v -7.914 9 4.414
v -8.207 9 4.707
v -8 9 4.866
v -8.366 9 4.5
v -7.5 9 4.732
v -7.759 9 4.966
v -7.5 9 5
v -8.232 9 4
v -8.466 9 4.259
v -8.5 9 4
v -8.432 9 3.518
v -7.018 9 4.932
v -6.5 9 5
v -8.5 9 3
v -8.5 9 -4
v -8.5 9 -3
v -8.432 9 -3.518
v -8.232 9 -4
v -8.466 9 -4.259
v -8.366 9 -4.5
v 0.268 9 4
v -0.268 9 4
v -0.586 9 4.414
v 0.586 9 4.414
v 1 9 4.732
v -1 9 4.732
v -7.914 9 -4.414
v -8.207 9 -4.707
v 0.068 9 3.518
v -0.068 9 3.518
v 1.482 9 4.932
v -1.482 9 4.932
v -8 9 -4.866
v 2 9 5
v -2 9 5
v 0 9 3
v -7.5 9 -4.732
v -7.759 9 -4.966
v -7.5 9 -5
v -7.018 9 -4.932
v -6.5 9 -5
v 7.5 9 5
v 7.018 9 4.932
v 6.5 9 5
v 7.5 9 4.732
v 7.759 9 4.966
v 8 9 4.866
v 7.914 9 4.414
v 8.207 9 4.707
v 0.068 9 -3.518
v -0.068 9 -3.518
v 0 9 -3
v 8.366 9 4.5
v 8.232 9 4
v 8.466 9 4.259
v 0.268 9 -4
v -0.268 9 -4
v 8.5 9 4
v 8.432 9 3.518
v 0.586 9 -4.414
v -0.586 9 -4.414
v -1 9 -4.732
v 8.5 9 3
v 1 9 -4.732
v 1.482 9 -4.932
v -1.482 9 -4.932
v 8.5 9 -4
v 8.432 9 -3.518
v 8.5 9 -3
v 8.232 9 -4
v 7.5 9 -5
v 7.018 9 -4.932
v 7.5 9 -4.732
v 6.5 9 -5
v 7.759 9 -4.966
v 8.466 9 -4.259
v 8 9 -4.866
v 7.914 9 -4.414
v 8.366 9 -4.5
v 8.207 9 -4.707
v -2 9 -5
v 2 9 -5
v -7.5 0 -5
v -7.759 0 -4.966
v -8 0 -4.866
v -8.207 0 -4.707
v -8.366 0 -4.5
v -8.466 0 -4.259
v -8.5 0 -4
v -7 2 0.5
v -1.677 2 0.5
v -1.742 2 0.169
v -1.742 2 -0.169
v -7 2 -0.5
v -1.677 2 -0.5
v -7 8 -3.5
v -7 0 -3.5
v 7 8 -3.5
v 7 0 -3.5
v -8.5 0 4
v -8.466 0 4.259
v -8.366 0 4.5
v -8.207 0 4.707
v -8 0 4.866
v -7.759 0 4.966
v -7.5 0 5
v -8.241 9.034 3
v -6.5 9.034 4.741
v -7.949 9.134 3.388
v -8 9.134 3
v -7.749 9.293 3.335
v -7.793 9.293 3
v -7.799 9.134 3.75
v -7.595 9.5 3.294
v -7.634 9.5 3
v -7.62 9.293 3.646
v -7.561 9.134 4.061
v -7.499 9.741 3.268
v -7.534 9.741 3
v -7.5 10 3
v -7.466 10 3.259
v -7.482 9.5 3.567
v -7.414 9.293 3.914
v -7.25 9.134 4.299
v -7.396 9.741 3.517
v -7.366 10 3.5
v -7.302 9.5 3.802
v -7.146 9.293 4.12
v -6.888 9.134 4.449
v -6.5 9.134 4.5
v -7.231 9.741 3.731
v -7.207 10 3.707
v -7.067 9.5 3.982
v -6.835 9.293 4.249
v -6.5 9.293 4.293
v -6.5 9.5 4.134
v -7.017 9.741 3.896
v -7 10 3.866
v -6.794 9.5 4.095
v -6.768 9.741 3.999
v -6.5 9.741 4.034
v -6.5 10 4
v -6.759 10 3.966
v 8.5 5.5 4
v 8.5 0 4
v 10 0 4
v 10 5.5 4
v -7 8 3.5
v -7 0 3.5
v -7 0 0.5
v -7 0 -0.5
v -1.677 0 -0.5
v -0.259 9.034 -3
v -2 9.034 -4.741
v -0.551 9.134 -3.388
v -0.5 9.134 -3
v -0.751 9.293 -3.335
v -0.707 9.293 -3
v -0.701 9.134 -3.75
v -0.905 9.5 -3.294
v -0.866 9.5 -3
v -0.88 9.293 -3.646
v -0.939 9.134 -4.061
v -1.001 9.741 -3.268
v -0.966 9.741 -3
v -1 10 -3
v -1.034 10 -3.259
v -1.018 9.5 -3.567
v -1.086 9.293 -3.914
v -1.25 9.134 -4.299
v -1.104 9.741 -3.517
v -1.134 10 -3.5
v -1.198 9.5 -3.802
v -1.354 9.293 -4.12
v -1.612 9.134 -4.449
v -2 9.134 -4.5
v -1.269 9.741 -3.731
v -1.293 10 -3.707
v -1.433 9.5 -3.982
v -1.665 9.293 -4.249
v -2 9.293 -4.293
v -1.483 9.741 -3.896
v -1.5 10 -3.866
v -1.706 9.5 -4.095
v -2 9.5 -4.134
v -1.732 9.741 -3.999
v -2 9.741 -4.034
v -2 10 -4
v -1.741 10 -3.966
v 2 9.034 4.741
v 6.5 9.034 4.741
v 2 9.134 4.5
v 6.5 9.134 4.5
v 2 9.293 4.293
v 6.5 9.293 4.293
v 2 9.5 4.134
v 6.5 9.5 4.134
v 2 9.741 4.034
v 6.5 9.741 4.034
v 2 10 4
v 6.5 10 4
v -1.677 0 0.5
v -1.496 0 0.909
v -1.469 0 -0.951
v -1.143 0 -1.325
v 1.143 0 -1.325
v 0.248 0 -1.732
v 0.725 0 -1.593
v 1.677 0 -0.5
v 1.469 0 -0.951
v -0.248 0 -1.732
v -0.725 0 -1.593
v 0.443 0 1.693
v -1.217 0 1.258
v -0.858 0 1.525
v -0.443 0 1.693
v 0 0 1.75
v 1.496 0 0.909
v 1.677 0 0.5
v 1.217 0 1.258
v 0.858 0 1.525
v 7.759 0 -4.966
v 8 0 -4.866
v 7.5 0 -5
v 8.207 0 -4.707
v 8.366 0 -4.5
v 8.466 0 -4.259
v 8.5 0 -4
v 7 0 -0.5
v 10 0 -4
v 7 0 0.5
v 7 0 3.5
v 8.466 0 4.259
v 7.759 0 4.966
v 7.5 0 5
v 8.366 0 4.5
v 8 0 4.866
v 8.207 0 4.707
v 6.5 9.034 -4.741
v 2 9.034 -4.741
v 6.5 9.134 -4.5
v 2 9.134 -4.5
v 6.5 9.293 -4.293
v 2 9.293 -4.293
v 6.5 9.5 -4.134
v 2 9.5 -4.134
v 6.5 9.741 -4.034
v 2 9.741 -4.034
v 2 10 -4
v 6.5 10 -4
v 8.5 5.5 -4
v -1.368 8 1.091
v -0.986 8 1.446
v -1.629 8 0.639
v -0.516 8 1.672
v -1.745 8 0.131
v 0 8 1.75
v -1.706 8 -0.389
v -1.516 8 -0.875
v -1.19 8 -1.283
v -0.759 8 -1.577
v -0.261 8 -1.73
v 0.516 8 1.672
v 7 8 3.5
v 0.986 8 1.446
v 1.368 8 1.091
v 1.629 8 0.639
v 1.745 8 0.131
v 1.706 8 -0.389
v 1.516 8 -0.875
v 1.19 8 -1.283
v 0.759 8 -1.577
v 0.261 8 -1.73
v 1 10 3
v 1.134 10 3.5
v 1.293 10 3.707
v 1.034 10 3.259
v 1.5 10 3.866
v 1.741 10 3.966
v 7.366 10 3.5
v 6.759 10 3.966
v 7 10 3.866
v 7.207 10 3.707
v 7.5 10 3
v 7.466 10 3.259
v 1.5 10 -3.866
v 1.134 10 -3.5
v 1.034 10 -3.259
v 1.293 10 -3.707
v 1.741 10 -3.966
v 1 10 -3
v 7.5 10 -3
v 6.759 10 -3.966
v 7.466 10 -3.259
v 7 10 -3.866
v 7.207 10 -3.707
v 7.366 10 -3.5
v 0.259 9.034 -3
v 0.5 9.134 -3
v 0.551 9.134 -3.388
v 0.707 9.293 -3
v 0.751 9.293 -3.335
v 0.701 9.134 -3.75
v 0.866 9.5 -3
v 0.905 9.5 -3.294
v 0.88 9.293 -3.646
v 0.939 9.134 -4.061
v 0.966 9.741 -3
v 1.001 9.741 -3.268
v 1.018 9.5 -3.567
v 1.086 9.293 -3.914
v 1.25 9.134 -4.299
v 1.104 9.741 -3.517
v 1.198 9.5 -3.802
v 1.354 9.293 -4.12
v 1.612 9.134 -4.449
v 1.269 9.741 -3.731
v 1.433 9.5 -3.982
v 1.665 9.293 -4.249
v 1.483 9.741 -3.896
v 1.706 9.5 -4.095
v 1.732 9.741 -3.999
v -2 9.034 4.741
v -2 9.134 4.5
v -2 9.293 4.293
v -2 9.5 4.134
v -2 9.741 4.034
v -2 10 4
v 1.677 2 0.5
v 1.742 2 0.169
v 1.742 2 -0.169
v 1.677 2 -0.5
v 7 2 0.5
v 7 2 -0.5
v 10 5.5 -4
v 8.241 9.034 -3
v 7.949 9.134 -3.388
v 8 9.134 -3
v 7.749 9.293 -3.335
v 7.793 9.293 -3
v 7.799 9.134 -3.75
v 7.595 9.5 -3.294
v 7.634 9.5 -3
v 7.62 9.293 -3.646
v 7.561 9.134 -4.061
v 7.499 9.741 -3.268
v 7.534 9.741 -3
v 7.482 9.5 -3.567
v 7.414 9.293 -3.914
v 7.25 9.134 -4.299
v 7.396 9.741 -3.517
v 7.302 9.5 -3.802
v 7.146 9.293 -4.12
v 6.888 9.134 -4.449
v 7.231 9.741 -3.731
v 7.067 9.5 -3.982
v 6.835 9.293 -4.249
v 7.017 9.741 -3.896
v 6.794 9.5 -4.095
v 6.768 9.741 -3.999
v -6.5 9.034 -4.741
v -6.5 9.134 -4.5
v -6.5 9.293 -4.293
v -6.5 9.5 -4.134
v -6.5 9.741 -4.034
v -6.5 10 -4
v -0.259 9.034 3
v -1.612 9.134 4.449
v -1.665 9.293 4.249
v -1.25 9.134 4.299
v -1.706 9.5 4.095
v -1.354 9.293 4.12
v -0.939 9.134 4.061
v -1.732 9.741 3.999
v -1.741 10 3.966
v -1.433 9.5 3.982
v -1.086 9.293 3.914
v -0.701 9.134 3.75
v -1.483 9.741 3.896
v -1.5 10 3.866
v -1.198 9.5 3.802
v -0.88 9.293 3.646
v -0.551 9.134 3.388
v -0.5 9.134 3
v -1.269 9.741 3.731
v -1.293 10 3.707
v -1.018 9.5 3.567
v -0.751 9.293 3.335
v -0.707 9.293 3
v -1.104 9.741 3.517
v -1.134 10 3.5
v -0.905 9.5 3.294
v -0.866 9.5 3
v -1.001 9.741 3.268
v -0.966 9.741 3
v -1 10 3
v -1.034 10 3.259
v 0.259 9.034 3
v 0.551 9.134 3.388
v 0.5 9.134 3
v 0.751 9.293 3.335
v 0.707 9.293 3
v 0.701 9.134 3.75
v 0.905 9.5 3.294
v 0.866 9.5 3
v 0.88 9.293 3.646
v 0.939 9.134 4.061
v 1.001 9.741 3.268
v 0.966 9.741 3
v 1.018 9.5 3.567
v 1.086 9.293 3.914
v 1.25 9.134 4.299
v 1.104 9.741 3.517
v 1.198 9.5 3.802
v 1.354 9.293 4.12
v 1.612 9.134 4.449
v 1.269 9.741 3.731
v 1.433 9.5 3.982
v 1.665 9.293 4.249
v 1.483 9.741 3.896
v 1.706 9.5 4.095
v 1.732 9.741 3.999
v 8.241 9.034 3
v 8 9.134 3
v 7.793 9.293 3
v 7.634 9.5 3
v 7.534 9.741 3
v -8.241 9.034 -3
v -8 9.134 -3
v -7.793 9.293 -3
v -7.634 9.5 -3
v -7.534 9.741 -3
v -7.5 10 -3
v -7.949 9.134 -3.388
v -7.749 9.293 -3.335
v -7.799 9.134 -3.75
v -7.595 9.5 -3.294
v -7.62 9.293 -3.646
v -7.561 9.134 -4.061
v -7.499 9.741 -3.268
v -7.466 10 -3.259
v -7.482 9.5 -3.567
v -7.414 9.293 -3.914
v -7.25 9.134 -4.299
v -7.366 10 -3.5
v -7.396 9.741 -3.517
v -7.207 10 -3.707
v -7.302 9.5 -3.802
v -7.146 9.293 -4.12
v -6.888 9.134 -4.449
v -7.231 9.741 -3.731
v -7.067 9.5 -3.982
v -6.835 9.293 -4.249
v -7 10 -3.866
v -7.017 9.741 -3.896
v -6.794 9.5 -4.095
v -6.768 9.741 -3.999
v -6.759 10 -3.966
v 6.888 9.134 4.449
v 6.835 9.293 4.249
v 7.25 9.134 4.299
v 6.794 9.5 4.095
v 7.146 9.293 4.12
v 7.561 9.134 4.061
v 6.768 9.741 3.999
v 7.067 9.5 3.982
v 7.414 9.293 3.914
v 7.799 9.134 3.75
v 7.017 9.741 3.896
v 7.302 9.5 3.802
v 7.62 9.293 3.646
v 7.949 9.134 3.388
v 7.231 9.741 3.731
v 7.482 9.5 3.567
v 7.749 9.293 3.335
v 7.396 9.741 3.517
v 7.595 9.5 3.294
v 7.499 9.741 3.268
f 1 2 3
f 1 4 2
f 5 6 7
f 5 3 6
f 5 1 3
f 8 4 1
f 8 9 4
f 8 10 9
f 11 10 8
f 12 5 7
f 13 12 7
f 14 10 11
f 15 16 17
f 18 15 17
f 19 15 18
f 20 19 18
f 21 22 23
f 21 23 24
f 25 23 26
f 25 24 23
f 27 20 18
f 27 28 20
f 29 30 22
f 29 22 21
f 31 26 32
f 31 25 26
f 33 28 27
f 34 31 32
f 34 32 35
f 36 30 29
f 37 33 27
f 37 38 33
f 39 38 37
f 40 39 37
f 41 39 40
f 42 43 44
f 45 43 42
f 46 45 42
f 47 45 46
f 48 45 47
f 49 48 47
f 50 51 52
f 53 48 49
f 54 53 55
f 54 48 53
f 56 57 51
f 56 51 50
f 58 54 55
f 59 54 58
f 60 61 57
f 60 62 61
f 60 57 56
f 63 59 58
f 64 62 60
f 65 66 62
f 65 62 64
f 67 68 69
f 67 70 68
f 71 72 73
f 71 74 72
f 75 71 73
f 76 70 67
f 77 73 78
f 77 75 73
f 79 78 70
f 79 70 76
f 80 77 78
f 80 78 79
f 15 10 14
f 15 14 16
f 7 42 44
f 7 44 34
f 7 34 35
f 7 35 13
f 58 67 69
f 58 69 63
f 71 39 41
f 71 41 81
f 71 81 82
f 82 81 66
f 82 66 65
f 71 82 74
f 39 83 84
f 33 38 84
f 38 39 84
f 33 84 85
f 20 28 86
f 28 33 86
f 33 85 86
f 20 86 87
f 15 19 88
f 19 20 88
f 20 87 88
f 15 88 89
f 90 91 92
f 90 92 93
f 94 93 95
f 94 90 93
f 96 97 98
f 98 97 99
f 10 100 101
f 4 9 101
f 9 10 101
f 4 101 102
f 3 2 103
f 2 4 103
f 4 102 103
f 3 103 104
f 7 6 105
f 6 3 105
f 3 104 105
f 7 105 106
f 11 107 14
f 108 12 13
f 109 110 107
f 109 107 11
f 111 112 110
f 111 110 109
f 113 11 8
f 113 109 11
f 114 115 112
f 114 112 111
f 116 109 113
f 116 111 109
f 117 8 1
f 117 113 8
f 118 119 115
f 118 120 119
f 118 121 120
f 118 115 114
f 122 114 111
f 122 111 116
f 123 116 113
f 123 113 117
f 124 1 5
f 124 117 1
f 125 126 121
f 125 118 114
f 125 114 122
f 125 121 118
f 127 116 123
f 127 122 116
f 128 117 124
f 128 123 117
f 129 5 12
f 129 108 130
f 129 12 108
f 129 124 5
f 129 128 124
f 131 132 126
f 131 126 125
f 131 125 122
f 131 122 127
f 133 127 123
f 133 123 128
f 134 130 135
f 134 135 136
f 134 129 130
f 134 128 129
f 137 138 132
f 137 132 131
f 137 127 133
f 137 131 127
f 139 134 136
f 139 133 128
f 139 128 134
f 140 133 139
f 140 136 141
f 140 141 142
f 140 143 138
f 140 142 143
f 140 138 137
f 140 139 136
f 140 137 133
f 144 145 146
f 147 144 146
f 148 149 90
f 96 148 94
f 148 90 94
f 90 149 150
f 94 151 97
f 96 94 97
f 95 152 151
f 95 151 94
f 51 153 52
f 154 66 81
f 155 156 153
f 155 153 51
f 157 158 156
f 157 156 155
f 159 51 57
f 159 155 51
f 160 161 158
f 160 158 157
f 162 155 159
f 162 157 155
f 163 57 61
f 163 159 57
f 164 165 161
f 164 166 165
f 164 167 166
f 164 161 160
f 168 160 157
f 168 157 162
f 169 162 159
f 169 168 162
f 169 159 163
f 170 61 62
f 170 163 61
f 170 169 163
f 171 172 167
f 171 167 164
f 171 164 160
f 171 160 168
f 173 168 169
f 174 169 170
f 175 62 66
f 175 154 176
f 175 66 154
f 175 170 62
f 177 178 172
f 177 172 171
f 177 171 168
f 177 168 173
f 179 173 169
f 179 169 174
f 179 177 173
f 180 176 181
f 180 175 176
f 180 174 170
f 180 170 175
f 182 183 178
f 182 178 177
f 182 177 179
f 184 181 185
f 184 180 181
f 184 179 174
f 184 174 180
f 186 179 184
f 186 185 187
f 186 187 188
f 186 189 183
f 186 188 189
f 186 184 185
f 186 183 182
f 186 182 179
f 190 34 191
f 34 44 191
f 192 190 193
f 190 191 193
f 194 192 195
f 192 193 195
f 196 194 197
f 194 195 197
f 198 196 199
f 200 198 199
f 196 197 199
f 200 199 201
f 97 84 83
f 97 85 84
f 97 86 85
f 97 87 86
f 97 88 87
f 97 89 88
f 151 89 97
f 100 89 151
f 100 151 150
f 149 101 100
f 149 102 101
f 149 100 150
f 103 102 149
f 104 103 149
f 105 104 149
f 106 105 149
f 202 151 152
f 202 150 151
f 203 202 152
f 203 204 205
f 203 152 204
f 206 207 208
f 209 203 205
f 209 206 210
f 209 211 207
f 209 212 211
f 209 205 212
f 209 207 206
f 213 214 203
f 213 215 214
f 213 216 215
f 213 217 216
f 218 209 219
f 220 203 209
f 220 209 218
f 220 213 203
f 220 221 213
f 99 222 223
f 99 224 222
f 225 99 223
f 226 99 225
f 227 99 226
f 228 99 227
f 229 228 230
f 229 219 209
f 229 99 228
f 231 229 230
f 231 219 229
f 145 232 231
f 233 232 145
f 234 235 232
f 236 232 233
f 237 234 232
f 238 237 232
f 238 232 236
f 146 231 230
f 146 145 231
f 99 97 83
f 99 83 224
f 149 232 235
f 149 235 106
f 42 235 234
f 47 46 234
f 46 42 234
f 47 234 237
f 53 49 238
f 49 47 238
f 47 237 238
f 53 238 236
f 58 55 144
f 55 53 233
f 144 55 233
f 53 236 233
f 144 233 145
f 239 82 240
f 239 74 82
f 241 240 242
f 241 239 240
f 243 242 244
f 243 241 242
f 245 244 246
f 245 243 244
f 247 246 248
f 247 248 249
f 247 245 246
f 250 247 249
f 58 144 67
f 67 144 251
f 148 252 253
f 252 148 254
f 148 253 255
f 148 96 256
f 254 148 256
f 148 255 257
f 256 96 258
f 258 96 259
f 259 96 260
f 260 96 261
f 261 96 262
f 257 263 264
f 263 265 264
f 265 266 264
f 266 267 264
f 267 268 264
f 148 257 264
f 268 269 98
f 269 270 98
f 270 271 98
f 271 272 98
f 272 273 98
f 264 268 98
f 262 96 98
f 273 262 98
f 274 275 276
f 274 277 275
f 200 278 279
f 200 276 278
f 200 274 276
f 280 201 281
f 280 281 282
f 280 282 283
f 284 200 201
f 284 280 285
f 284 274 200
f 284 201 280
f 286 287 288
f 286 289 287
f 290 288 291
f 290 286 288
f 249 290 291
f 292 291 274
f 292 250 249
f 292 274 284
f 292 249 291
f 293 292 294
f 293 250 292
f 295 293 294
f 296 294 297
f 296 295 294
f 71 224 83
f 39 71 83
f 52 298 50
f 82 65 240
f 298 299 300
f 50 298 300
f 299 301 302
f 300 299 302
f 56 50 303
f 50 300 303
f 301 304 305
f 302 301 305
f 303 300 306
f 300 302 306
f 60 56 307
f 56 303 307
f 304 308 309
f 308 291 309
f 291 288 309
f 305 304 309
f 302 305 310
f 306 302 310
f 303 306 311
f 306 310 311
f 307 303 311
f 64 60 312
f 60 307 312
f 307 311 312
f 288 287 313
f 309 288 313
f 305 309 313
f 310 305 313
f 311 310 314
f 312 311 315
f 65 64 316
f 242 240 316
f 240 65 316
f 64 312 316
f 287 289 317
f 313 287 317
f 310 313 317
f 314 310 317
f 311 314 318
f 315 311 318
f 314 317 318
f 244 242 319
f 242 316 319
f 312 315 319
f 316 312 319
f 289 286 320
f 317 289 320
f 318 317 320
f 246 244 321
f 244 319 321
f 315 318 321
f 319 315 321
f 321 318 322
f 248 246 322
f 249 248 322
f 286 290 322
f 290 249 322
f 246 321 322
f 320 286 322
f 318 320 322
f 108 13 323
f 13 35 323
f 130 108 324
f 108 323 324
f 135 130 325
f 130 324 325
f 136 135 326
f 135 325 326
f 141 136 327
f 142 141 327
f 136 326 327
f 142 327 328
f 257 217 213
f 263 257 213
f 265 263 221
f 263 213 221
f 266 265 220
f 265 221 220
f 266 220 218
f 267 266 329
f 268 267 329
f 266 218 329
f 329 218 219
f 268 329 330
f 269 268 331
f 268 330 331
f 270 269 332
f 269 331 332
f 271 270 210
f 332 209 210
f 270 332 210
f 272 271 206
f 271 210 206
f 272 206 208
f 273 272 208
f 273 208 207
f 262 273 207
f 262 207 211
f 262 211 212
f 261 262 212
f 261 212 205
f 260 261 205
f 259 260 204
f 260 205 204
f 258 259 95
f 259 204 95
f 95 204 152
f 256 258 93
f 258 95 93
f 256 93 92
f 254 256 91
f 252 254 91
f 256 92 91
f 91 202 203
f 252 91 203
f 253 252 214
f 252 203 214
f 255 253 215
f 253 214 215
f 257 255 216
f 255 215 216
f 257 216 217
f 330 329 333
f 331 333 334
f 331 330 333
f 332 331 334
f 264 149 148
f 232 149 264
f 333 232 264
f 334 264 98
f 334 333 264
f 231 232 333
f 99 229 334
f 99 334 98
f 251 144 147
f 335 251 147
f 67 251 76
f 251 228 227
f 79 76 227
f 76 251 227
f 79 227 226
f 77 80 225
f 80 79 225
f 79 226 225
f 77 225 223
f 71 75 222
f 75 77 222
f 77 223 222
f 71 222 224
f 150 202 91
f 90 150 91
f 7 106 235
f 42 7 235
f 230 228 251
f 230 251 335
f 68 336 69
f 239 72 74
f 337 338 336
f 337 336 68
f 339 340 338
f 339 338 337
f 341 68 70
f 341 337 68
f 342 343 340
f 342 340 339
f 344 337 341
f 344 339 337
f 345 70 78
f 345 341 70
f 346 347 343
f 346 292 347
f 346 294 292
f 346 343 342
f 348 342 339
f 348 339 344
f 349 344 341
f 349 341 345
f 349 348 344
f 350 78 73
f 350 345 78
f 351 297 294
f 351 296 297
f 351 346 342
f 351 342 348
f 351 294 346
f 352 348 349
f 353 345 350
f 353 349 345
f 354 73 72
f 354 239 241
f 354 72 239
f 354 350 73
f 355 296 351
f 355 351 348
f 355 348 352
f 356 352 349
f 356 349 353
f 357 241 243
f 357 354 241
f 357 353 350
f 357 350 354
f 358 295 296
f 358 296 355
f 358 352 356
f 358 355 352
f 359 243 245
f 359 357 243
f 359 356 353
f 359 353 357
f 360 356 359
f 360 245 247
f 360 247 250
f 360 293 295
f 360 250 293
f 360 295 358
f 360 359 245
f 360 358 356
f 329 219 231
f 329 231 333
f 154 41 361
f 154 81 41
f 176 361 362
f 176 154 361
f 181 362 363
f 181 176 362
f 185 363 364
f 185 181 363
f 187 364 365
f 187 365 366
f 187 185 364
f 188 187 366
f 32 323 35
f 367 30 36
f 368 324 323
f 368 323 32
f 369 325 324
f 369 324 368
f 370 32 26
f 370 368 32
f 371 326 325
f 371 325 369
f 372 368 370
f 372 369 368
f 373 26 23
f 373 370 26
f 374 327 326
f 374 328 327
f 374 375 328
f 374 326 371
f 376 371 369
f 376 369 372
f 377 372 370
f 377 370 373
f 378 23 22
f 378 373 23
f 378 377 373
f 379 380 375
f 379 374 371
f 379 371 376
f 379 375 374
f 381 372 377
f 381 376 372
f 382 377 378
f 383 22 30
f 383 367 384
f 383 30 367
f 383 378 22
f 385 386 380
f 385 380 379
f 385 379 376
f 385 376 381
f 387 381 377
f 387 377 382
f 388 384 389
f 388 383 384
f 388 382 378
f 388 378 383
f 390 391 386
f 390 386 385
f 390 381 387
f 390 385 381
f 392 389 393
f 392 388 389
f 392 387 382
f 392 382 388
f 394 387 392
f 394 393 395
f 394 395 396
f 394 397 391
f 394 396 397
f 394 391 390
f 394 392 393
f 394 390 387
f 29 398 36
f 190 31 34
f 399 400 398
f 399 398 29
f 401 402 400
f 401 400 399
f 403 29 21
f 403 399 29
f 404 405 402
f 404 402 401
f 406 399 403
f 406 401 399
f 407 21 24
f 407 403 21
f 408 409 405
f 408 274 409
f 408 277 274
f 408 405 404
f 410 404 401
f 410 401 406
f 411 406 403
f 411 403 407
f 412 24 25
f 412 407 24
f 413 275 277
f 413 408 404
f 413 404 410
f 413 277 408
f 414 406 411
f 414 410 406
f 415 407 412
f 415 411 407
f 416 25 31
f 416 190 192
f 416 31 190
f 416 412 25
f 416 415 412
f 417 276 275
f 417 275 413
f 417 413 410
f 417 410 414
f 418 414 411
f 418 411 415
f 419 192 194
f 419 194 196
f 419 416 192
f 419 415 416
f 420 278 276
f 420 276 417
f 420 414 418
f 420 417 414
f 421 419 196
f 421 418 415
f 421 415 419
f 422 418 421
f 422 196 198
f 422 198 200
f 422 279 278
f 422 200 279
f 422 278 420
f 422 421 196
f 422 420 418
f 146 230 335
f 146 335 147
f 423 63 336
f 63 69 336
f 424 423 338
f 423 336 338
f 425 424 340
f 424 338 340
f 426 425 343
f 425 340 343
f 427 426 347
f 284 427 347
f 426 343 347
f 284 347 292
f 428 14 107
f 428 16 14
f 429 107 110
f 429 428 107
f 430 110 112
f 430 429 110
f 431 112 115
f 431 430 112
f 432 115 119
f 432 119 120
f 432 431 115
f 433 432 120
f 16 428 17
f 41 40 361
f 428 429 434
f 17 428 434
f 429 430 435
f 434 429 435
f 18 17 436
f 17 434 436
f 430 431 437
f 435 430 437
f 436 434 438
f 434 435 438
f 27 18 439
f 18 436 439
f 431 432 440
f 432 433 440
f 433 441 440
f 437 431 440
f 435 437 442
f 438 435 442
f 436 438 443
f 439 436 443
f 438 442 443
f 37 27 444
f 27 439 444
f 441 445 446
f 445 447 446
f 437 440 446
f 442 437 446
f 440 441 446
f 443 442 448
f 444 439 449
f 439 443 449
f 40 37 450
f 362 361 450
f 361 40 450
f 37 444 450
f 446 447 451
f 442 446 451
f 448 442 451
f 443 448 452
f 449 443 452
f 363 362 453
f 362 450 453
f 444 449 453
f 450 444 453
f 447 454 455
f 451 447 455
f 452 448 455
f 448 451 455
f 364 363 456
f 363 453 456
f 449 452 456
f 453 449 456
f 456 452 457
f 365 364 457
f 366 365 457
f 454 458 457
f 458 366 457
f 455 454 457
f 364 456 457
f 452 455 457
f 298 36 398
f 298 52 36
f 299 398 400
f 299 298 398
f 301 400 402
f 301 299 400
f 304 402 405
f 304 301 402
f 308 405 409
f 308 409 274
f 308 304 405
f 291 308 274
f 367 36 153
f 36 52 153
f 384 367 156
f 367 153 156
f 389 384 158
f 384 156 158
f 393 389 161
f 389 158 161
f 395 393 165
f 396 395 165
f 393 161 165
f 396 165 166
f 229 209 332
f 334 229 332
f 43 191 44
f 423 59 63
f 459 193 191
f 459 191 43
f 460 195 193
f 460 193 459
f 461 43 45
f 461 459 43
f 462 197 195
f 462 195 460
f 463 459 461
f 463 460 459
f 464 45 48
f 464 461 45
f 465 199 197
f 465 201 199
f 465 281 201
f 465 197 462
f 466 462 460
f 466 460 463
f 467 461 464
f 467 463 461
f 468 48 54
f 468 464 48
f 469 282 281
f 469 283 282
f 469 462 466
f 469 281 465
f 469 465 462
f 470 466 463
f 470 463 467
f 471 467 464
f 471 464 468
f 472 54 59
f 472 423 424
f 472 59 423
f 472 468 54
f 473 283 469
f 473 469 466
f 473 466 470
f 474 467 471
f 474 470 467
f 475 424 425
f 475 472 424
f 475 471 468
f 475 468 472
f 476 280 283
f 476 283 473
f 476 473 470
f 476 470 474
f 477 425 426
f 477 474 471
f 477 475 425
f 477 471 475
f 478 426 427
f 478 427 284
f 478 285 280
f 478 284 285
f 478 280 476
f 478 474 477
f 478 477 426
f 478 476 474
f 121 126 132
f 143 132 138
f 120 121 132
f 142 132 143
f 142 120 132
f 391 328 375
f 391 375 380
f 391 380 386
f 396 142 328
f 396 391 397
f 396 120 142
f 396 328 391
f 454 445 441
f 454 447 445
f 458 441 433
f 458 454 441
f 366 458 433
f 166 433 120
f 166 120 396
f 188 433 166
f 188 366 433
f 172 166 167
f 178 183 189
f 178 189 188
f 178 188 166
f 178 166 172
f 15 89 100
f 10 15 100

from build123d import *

# Parameters (mm, degrees)
BOSS_EXTRUDE1_DEPTH = 10
SKETCH2_W           = 14
SKETCH2_H           = 7
SKETCH2_R           = 1.75
CUT_EXTRUDE1_DEPTH  = 8
SKETCH3_W           = 1
SKETCH3_H           = 2
BOSS_EXTRUDE2_DEPTH = 14
SKETCH4_W           = 1.5
SKETCH4_H           = 8
BOSS_EXTRUDE3_DEPTH = 5.5
SKETCH5_W           = 17
SKETCH5_H           = 10
SKETCH5_W_2         = 6.5
SKETCH5_H_2         = 8
CUT_EXTRUDE2_DEPTH  = 1
FILLET2_R           = 1


with BuildPart() as part:
    # Sketch1 → Boss-Extrude1 (new body)
    with BuildSketch(Plane(origin=(0, 0, 0), x_dir=(1, 0, 0), z_dir=(0, 1, 0))):
        with BuildLine():
            Line((-7.5, -5), (7.5, -5))
            ThreePointArc((7.5, -5), (8.207106781, -4.707106781), (8.5, -4))
            Line((8.5, -4), (8.5, 4))
            ThreePointArc((8.5, 4), (8.207106781, 4.707106781), (7.5, 5))
            Line((7.5, 5), (-7.5, 5))
            ThreePointArc((-7.5, 5), (-8.207106781, 4.707106781), (-8.5, 4))
            Line((-8.5, 4), (-8.5, -4))
            ThreePointArc((-8.5, -4), (-8.207106781, -4.707106781), (-7.5, -5))
        make_face()
    extrude(amount=BOSS_EXTRUDE1_DEPTH)

    # Sketch2 → Cut-Extrude1 (cut)
    with BuildSketch(Plane(origin=(0, 0, 0), x_dir=(1, 0, 0), z_dir=(0, 1, 0))):
        Rectangle(SKETCH2_W, SKETCH2_H)
        with Locations(Location((0, 0, 0), (0, 0, 270))):
            Circle(SKETCH2_R, mode=Mode.SUBTRACT)
    extrude(amount=CUT_EXTRUDE1_DEPTH, mode=Mode.SUBTRACT)

    # Sketch3 → Boss-Extrude2 (add)
    with BuildSketch(Plane(origin=(-7, 0, 0), x_dir=(0, 0, -1), z_dir=(1, 0, 0))):
        with Locations((0, 1)):
            Rectangle(SKETCH3_W, SKETCH3_H)
    extrude(amount=BOSS_EXTRUDE2_DEPTH)

    # Sketch4 → Boss-Extrude3 (add)
    with BuildSketch(Plane.XZ):
        with Locations((9.25, 0)):
            Rectangle(SKETCH4_W, SKETCH4_H)
    extrude(amount=-BOSS_EXTRUDE3_DEPTH)

    # Sketch5 → Cut-Extrude2 (cut)
    with BuildSketch(Plane(origin=(0, 10, 0), x_dir=(1, 0, 0), z_dir=(0, 1, 0))):
        Rectangle(SKETCH5_W, SKETCH5_H)
        with Locations((-4.25, 0)):
            Rectangle(SKETCH5_W_2, SKETCH5_H_2, mode=Mode.SUBTRACT)
        with Locations((4.25, 0)):
            Rectangle(SKETCH5_W_2, SKETCH5_H_2, mode=Mode.SUBTRACT)
    extrude(amount=-CUT_EXTRUDE2_DEPTH, mode=Mode.SUBTRACT)

    # Fillet2
    fillet2_edges = [part.edges().sort_by_distance(p)[0] for p in [
        (-7.5, 9.5, -4),
        (-1, 9.5, -4),
        (-1, 9.5, 4),
        (-7.5, 9.5, 4),
        (1, 9.5, -4),
        (7.5, 9.5, -4),
        (7.5, 9.5, 4),
        (1, 9.5, 4),
        (1, 9, 0),
        (4.25, 9, 4),
        (7.5, 9, 0),
        (4.25, 9, -4),
        (-7.5, 9, 0),
        (-4.25, 9, 4),
        (-1, 9, 0),
        (-4.25, 9, -4),
    ]]
    fillet(fillet2_edges, radius=FILLET2_R - 0.0001)  # a hair under: the kernel refuses the full size


solid = part.part
